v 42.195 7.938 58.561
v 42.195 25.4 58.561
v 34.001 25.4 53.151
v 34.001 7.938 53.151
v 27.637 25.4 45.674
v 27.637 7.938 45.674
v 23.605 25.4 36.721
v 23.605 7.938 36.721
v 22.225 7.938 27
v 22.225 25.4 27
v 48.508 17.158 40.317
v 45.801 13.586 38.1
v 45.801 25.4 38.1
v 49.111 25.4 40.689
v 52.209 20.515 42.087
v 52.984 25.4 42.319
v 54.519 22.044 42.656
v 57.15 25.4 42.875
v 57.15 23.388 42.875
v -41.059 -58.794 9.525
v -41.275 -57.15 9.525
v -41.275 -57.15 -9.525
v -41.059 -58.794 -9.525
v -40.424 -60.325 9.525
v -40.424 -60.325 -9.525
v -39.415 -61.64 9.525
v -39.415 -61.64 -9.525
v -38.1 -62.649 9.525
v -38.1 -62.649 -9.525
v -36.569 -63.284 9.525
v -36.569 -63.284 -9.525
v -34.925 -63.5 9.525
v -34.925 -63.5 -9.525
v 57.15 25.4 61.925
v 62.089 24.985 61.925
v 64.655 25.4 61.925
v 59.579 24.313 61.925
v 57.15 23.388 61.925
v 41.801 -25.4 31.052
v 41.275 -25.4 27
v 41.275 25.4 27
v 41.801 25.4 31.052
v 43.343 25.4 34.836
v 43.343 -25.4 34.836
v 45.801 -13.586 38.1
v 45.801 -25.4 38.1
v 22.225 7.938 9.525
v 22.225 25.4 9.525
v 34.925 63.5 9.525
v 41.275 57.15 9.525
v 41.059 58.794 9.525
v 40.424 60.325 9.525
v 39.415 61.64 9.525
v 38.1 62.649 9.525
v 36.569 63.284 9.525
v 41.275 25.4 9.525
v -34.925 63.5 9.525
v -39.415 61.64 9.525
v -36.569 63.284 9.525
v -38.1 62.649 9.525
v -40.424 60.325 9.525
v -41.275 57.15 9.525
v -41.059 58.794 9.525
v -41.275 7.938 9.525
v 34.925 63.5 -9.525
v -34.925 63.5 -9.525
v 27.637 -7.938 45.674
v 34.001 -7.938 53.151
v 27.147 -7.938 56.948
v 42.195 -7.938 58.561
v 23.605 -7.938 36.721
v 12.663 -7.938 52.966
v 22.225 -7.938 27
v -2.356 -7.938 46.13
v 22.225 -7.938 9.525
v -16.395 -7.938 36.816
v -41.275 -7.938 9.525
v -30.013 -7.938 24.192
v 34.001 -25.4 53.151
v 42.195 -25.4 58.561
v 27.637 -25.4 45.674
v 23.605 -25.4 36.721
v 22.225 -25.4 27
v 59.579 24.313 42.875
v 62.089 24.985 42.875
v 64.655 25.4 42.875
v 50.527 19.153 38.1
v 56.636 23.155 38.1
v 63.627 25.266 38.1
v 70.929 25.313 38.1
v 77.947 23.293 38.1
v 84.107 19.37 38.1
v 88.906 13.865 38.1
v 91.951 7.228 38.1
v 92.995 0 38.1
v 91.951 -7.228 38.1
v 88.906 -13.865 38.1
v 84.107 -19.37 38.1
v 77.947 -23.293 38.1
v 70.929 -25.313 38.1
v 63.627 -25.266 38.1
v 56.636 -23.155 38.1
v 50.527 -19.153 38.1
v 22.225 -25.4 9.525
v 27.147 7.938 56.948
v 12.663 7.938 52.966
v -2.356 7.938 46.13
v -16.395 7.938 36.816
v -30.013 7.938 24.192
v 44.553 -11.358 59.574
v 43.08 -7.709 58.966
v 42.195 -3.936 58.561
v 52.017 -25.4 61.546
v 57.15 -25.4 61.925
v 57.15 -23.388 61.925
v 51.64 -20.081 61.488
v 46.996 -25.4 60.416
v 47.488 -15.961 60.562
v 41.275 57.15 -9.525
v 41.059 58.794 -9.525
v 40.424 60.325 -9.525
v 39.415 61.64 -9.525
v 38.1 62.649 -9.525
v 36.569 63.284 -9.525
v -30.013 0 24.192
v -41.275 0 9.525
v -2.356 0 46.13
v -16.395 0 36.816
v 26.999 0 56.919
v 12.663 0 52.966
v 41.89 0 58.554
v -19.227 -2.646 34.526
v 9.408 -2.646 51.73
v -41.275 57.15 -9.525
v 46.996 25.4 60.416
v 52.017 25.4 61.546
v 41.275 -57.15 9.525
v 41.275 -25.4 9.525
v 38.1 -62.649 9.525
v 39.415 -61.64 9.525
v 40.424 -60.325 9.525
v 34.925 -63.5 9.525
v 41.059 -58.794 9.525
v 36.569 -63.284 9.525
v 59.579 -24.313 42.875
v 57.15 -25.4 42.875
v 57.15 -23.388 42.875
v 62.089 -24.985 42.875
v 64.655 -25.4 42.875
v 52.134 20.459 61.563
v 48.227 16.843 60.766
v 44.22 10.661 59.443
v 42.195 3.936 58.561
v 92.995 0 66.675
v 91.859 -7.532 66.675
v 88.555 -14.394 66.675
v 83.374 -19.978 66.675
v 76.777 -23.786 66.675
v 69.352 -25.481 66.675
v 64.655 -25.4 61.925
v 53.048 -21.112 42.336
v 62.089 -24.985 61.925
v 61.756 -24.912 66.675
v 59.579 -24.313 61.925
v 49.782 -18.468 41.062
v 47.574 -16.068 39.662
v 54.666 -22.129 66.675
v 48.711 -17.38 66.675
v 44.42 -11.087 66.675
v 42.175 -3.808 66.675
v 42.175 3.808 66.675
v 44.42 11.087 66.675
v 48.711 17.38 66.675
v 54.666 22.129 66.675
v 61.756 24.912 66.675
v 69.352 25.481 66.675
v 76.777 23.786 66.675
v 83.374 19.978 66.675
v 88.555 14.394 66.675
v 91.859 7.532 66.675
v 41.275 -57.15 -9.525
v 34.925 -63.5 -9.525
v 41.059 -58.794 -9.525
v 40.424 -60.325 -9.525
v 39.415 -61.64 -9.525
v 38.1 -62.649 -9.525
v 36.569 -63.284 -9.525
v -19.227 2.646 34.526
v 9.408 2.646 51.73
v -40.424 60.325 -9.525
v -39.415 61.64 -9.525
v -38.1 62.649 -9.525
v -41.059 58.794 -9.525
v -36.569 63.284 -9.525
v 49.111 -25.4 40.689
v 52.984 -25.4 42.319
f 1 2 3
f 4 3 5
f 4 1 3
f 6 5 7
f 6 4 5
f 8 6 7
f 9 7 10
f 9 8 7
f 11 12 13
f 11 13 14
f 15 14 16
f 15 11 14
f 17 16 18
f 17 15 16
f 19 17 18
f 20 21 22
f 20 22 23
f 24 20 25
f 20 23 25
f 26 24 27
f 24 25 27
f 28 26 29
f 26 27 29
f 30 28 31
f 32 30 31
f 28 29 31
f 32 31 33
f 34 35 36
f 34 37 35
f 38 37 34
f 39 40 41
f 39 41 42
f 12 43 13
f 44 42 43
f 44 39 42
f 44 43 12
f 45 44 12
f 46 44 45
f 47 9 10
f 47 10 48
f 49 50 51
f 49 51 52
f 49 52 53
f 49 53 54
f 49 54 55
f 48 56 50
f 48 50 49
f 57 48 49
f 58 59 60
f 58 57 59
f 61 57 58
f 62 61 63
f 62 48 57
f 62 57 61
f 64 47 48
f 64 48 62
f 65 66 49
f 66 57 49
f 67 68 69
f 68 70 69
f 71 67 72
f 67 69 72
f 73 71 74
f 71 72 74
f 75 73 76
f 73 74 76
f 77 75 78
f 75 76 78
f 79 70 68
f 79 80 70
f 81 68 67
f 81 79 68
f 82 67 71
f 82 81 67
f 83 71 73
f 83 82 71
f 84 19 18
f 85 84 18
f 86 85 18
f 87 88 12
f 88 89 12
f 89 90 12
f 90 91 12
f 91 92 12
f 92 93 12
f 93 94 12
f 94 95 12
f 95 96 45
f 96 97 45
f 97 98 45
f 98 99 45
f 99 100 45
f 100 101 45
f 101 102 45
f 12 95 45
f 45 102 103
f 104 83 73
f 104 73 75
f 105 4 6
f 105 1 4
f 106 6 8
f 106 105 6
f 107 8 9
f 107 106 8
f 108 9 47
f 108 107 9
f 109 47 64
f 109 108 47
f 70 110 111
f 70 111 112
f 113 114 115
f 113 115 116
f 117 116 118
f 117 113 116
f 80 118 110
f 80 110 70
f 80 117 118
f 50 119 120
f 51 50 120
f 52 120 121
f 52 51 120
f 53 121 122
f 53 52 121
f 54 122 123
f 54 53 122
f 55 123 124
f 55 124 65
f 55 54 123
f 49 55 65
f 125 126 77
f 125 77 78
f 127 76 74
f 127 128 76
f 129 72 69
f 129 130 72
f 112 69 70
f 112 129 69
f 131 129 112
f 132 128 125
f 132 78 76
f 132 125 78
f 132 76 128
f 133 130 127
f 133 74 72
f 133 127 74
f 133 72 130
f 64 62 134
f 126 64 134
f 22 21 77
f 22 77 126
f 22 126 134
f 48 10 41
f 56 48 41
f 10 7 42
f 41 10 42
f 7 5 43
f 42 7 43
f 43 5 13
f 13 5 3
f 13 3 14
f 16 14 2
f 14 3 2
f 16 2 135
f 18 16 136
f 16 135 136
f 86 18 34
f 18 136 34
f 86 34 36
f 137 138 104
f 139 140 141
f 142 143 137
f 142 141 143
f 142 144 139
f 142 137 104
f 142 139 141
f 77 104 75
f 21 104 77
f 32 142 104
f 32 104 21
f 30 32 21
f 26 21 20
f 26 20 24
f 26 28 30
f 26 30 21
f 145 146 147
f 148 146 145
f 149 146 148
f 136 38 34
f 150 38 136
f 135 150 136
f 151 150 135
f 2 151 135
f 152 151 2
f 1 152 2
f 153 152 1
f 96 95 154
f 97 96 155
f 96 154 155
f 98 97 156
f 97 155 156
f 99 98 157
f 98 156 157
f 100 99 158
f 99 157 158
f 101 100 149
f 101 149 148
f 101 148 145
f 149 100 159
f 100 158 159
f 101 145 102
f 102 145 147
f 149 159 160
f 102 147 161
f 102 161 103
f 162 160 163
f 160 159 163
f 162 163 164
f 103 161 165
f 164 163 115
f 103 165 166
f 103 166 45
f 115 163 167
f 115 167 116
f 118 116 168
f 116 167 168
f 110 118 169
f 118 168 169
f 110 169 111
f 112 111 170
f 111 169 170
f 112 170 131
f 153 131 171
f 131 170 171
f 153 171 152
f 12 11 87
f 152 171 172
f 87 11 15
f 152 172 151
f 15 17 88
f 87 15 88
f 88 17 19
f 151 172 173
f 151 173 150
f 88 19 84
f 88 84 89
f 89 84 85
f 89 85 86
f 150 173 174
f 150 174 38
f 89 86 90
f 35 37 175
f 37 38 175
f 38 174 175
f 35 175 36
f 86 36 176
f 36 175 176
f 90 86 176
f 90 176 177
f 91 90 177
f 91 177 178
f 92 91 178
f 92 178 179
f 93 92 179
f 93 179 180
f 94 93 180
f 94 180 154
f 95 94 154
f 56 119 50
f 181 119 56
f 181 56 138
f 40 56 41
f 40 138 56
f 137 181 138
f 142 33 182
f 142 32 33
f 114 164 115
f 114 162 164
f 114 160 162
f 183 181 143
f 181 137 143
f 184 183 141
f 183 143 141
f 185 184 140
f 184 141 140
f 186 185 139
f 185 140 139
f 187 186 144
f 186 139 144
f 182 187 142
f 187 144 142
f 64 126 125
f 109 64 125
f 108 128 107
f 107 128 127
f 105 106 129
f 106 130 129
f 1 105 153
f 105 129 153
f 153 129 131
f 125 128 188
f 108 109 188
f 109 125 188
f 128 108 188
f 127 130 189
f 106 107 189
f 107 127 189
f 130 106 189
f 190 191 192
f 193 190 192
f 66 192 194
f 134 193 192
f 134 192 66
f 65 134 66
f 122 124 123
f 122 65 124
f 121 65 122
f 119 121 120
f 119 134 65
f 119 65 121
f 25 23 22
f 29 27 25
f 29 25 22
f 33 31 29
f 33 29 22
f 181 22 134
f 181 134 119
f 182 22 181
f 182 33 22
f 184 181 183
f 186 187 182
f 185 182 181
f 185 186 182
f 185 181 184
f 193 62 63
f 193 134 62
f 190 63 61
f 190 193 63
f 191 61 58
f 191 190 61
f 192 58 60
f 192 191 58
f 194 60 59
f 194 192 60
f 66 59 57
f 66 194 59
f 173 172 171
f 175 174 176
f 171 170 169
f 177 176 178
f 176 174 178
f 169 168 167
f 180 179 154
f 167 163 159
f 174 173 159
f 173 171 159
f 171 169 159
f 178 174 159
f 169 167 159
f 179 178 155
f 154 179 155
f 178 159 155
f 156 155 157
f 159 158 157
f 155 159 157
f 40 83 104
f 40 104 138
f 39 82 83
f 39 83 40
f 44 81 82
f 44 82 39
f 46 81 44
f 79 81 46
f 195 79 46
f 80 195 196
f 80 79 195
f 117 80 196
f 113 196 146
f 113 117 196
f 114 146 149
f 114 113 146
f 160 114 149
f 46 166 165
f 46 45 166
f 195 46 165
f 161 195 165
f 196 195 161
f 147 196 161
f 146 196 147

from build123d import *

# Parameters (mm, degrees)
F1_DEPTH = 63.5
F2_DEPTH = 25.4
F3_DEPTH = 7.9375
F5_R     = 6.35


with BuildPart() as f1:
    # F0 (on Front) → F1 (new body, symmetric)
    with BuildSketch(Plane.XZ):
        Polygon((-41.275, -9.525), (41.275, -9.525), (41.275, 9.525), (22.225, 9.525), (-41.275, 9.525), align=None)
    extrude(amount=F1_DEPTH, both=True)

    # F0 (on Front) → F2 (join, symmetric)
    with BuildSketch(Plane.XZ):
        with BuildLine():
            Line((22.225, 9.525), (41.275, 9.525))
            Line((41.275, 9.525), (41.275, 27.0002))
            ThreePointArc((41.275, 27.0002), (42.449861, 32.993658), (45.800548, 38.1))
            Line((45.800548, 38.1), (42.194617, 38.1))
            Line((42.194617, 38.1), (42.194617, 58.561128))
            ThreePointArc((42.194617, 58.561128), (27.636678, 45.674231), (22.225, 27.0002))
            Line((22.225, 27.0002), (22.225, 9.525))
        make_face()
        with BuildLine():
            ThreePointArc((57.15, 61.9252), (49.485464, 61.073804), (42.194617, 58.561128))
            Line((42.194617, 58.561128), (42.194617, 38.1))
            Line((42.194617, 38.1), (45.800548, 38.1))
            ThreePointArc((45.800548, 38.1), (50.993447, 41.632783), (57.15, 42.8752))
            Line((57.15, 42.8752), (67.442127, 42.8752))
            Line((67.442127, 42.8752), (67.442127, 61.9252))
            Line((67.442127, 61.9252), (57.15, 61.9252))
        make_face()
    extrude(amount=F2_DEPTH, both=True)

    # F0 (on Front) → F3 (join, symmetric)
    with BuildSketch(Plane.XZ):
        with BuildLine():
            add(Edge.make_bspline(
                [(-41.275, 9.525), (-23.330939, 37.566107), (8.143247, 57.774324), (42.194617, 58.561128)],
                knots=[0, 0, 0, 0, 96.807638, 96.807638, 96.807638, 96.807638], degree=3))
            Line((-41.275, 9.525), (22.225, 9.525))
            Line((22.225, 9.525), (22.225, 27.0002))
            ThreePointArc((22.225, 27.0002), (27.636678, 45.674231), (42.194617, 58.561128))
        make_face()
    extrude(amount=F3_DEPTH, both=True)

    # F0 (on Front) → F4 (revolve)
    with BuildSketch(Plane.XZ):
        Polygon((67.442127, 42.8752), (67.442127, 38.1), (92.994617, 38.1), (92.994617, 66.675), (67.442127, 66.675), (67.442127, 61.9252), align=None)
    revolve(axis=Axis((67.442127, 0, 52.3875), (0, 0, -1)))

    # F5
    f5_edges = [f1.edges().sort_by_distance(p)[0] for p in [
        (41.275, -63.5, 0),
        (-41.275, -63.5, 0),
        (41.275, 63.5, 0),
        (-41.275, 63.5, 0),
    ]]
    fillet(f5_edges, radius=F5_R)


solid = f1.part
